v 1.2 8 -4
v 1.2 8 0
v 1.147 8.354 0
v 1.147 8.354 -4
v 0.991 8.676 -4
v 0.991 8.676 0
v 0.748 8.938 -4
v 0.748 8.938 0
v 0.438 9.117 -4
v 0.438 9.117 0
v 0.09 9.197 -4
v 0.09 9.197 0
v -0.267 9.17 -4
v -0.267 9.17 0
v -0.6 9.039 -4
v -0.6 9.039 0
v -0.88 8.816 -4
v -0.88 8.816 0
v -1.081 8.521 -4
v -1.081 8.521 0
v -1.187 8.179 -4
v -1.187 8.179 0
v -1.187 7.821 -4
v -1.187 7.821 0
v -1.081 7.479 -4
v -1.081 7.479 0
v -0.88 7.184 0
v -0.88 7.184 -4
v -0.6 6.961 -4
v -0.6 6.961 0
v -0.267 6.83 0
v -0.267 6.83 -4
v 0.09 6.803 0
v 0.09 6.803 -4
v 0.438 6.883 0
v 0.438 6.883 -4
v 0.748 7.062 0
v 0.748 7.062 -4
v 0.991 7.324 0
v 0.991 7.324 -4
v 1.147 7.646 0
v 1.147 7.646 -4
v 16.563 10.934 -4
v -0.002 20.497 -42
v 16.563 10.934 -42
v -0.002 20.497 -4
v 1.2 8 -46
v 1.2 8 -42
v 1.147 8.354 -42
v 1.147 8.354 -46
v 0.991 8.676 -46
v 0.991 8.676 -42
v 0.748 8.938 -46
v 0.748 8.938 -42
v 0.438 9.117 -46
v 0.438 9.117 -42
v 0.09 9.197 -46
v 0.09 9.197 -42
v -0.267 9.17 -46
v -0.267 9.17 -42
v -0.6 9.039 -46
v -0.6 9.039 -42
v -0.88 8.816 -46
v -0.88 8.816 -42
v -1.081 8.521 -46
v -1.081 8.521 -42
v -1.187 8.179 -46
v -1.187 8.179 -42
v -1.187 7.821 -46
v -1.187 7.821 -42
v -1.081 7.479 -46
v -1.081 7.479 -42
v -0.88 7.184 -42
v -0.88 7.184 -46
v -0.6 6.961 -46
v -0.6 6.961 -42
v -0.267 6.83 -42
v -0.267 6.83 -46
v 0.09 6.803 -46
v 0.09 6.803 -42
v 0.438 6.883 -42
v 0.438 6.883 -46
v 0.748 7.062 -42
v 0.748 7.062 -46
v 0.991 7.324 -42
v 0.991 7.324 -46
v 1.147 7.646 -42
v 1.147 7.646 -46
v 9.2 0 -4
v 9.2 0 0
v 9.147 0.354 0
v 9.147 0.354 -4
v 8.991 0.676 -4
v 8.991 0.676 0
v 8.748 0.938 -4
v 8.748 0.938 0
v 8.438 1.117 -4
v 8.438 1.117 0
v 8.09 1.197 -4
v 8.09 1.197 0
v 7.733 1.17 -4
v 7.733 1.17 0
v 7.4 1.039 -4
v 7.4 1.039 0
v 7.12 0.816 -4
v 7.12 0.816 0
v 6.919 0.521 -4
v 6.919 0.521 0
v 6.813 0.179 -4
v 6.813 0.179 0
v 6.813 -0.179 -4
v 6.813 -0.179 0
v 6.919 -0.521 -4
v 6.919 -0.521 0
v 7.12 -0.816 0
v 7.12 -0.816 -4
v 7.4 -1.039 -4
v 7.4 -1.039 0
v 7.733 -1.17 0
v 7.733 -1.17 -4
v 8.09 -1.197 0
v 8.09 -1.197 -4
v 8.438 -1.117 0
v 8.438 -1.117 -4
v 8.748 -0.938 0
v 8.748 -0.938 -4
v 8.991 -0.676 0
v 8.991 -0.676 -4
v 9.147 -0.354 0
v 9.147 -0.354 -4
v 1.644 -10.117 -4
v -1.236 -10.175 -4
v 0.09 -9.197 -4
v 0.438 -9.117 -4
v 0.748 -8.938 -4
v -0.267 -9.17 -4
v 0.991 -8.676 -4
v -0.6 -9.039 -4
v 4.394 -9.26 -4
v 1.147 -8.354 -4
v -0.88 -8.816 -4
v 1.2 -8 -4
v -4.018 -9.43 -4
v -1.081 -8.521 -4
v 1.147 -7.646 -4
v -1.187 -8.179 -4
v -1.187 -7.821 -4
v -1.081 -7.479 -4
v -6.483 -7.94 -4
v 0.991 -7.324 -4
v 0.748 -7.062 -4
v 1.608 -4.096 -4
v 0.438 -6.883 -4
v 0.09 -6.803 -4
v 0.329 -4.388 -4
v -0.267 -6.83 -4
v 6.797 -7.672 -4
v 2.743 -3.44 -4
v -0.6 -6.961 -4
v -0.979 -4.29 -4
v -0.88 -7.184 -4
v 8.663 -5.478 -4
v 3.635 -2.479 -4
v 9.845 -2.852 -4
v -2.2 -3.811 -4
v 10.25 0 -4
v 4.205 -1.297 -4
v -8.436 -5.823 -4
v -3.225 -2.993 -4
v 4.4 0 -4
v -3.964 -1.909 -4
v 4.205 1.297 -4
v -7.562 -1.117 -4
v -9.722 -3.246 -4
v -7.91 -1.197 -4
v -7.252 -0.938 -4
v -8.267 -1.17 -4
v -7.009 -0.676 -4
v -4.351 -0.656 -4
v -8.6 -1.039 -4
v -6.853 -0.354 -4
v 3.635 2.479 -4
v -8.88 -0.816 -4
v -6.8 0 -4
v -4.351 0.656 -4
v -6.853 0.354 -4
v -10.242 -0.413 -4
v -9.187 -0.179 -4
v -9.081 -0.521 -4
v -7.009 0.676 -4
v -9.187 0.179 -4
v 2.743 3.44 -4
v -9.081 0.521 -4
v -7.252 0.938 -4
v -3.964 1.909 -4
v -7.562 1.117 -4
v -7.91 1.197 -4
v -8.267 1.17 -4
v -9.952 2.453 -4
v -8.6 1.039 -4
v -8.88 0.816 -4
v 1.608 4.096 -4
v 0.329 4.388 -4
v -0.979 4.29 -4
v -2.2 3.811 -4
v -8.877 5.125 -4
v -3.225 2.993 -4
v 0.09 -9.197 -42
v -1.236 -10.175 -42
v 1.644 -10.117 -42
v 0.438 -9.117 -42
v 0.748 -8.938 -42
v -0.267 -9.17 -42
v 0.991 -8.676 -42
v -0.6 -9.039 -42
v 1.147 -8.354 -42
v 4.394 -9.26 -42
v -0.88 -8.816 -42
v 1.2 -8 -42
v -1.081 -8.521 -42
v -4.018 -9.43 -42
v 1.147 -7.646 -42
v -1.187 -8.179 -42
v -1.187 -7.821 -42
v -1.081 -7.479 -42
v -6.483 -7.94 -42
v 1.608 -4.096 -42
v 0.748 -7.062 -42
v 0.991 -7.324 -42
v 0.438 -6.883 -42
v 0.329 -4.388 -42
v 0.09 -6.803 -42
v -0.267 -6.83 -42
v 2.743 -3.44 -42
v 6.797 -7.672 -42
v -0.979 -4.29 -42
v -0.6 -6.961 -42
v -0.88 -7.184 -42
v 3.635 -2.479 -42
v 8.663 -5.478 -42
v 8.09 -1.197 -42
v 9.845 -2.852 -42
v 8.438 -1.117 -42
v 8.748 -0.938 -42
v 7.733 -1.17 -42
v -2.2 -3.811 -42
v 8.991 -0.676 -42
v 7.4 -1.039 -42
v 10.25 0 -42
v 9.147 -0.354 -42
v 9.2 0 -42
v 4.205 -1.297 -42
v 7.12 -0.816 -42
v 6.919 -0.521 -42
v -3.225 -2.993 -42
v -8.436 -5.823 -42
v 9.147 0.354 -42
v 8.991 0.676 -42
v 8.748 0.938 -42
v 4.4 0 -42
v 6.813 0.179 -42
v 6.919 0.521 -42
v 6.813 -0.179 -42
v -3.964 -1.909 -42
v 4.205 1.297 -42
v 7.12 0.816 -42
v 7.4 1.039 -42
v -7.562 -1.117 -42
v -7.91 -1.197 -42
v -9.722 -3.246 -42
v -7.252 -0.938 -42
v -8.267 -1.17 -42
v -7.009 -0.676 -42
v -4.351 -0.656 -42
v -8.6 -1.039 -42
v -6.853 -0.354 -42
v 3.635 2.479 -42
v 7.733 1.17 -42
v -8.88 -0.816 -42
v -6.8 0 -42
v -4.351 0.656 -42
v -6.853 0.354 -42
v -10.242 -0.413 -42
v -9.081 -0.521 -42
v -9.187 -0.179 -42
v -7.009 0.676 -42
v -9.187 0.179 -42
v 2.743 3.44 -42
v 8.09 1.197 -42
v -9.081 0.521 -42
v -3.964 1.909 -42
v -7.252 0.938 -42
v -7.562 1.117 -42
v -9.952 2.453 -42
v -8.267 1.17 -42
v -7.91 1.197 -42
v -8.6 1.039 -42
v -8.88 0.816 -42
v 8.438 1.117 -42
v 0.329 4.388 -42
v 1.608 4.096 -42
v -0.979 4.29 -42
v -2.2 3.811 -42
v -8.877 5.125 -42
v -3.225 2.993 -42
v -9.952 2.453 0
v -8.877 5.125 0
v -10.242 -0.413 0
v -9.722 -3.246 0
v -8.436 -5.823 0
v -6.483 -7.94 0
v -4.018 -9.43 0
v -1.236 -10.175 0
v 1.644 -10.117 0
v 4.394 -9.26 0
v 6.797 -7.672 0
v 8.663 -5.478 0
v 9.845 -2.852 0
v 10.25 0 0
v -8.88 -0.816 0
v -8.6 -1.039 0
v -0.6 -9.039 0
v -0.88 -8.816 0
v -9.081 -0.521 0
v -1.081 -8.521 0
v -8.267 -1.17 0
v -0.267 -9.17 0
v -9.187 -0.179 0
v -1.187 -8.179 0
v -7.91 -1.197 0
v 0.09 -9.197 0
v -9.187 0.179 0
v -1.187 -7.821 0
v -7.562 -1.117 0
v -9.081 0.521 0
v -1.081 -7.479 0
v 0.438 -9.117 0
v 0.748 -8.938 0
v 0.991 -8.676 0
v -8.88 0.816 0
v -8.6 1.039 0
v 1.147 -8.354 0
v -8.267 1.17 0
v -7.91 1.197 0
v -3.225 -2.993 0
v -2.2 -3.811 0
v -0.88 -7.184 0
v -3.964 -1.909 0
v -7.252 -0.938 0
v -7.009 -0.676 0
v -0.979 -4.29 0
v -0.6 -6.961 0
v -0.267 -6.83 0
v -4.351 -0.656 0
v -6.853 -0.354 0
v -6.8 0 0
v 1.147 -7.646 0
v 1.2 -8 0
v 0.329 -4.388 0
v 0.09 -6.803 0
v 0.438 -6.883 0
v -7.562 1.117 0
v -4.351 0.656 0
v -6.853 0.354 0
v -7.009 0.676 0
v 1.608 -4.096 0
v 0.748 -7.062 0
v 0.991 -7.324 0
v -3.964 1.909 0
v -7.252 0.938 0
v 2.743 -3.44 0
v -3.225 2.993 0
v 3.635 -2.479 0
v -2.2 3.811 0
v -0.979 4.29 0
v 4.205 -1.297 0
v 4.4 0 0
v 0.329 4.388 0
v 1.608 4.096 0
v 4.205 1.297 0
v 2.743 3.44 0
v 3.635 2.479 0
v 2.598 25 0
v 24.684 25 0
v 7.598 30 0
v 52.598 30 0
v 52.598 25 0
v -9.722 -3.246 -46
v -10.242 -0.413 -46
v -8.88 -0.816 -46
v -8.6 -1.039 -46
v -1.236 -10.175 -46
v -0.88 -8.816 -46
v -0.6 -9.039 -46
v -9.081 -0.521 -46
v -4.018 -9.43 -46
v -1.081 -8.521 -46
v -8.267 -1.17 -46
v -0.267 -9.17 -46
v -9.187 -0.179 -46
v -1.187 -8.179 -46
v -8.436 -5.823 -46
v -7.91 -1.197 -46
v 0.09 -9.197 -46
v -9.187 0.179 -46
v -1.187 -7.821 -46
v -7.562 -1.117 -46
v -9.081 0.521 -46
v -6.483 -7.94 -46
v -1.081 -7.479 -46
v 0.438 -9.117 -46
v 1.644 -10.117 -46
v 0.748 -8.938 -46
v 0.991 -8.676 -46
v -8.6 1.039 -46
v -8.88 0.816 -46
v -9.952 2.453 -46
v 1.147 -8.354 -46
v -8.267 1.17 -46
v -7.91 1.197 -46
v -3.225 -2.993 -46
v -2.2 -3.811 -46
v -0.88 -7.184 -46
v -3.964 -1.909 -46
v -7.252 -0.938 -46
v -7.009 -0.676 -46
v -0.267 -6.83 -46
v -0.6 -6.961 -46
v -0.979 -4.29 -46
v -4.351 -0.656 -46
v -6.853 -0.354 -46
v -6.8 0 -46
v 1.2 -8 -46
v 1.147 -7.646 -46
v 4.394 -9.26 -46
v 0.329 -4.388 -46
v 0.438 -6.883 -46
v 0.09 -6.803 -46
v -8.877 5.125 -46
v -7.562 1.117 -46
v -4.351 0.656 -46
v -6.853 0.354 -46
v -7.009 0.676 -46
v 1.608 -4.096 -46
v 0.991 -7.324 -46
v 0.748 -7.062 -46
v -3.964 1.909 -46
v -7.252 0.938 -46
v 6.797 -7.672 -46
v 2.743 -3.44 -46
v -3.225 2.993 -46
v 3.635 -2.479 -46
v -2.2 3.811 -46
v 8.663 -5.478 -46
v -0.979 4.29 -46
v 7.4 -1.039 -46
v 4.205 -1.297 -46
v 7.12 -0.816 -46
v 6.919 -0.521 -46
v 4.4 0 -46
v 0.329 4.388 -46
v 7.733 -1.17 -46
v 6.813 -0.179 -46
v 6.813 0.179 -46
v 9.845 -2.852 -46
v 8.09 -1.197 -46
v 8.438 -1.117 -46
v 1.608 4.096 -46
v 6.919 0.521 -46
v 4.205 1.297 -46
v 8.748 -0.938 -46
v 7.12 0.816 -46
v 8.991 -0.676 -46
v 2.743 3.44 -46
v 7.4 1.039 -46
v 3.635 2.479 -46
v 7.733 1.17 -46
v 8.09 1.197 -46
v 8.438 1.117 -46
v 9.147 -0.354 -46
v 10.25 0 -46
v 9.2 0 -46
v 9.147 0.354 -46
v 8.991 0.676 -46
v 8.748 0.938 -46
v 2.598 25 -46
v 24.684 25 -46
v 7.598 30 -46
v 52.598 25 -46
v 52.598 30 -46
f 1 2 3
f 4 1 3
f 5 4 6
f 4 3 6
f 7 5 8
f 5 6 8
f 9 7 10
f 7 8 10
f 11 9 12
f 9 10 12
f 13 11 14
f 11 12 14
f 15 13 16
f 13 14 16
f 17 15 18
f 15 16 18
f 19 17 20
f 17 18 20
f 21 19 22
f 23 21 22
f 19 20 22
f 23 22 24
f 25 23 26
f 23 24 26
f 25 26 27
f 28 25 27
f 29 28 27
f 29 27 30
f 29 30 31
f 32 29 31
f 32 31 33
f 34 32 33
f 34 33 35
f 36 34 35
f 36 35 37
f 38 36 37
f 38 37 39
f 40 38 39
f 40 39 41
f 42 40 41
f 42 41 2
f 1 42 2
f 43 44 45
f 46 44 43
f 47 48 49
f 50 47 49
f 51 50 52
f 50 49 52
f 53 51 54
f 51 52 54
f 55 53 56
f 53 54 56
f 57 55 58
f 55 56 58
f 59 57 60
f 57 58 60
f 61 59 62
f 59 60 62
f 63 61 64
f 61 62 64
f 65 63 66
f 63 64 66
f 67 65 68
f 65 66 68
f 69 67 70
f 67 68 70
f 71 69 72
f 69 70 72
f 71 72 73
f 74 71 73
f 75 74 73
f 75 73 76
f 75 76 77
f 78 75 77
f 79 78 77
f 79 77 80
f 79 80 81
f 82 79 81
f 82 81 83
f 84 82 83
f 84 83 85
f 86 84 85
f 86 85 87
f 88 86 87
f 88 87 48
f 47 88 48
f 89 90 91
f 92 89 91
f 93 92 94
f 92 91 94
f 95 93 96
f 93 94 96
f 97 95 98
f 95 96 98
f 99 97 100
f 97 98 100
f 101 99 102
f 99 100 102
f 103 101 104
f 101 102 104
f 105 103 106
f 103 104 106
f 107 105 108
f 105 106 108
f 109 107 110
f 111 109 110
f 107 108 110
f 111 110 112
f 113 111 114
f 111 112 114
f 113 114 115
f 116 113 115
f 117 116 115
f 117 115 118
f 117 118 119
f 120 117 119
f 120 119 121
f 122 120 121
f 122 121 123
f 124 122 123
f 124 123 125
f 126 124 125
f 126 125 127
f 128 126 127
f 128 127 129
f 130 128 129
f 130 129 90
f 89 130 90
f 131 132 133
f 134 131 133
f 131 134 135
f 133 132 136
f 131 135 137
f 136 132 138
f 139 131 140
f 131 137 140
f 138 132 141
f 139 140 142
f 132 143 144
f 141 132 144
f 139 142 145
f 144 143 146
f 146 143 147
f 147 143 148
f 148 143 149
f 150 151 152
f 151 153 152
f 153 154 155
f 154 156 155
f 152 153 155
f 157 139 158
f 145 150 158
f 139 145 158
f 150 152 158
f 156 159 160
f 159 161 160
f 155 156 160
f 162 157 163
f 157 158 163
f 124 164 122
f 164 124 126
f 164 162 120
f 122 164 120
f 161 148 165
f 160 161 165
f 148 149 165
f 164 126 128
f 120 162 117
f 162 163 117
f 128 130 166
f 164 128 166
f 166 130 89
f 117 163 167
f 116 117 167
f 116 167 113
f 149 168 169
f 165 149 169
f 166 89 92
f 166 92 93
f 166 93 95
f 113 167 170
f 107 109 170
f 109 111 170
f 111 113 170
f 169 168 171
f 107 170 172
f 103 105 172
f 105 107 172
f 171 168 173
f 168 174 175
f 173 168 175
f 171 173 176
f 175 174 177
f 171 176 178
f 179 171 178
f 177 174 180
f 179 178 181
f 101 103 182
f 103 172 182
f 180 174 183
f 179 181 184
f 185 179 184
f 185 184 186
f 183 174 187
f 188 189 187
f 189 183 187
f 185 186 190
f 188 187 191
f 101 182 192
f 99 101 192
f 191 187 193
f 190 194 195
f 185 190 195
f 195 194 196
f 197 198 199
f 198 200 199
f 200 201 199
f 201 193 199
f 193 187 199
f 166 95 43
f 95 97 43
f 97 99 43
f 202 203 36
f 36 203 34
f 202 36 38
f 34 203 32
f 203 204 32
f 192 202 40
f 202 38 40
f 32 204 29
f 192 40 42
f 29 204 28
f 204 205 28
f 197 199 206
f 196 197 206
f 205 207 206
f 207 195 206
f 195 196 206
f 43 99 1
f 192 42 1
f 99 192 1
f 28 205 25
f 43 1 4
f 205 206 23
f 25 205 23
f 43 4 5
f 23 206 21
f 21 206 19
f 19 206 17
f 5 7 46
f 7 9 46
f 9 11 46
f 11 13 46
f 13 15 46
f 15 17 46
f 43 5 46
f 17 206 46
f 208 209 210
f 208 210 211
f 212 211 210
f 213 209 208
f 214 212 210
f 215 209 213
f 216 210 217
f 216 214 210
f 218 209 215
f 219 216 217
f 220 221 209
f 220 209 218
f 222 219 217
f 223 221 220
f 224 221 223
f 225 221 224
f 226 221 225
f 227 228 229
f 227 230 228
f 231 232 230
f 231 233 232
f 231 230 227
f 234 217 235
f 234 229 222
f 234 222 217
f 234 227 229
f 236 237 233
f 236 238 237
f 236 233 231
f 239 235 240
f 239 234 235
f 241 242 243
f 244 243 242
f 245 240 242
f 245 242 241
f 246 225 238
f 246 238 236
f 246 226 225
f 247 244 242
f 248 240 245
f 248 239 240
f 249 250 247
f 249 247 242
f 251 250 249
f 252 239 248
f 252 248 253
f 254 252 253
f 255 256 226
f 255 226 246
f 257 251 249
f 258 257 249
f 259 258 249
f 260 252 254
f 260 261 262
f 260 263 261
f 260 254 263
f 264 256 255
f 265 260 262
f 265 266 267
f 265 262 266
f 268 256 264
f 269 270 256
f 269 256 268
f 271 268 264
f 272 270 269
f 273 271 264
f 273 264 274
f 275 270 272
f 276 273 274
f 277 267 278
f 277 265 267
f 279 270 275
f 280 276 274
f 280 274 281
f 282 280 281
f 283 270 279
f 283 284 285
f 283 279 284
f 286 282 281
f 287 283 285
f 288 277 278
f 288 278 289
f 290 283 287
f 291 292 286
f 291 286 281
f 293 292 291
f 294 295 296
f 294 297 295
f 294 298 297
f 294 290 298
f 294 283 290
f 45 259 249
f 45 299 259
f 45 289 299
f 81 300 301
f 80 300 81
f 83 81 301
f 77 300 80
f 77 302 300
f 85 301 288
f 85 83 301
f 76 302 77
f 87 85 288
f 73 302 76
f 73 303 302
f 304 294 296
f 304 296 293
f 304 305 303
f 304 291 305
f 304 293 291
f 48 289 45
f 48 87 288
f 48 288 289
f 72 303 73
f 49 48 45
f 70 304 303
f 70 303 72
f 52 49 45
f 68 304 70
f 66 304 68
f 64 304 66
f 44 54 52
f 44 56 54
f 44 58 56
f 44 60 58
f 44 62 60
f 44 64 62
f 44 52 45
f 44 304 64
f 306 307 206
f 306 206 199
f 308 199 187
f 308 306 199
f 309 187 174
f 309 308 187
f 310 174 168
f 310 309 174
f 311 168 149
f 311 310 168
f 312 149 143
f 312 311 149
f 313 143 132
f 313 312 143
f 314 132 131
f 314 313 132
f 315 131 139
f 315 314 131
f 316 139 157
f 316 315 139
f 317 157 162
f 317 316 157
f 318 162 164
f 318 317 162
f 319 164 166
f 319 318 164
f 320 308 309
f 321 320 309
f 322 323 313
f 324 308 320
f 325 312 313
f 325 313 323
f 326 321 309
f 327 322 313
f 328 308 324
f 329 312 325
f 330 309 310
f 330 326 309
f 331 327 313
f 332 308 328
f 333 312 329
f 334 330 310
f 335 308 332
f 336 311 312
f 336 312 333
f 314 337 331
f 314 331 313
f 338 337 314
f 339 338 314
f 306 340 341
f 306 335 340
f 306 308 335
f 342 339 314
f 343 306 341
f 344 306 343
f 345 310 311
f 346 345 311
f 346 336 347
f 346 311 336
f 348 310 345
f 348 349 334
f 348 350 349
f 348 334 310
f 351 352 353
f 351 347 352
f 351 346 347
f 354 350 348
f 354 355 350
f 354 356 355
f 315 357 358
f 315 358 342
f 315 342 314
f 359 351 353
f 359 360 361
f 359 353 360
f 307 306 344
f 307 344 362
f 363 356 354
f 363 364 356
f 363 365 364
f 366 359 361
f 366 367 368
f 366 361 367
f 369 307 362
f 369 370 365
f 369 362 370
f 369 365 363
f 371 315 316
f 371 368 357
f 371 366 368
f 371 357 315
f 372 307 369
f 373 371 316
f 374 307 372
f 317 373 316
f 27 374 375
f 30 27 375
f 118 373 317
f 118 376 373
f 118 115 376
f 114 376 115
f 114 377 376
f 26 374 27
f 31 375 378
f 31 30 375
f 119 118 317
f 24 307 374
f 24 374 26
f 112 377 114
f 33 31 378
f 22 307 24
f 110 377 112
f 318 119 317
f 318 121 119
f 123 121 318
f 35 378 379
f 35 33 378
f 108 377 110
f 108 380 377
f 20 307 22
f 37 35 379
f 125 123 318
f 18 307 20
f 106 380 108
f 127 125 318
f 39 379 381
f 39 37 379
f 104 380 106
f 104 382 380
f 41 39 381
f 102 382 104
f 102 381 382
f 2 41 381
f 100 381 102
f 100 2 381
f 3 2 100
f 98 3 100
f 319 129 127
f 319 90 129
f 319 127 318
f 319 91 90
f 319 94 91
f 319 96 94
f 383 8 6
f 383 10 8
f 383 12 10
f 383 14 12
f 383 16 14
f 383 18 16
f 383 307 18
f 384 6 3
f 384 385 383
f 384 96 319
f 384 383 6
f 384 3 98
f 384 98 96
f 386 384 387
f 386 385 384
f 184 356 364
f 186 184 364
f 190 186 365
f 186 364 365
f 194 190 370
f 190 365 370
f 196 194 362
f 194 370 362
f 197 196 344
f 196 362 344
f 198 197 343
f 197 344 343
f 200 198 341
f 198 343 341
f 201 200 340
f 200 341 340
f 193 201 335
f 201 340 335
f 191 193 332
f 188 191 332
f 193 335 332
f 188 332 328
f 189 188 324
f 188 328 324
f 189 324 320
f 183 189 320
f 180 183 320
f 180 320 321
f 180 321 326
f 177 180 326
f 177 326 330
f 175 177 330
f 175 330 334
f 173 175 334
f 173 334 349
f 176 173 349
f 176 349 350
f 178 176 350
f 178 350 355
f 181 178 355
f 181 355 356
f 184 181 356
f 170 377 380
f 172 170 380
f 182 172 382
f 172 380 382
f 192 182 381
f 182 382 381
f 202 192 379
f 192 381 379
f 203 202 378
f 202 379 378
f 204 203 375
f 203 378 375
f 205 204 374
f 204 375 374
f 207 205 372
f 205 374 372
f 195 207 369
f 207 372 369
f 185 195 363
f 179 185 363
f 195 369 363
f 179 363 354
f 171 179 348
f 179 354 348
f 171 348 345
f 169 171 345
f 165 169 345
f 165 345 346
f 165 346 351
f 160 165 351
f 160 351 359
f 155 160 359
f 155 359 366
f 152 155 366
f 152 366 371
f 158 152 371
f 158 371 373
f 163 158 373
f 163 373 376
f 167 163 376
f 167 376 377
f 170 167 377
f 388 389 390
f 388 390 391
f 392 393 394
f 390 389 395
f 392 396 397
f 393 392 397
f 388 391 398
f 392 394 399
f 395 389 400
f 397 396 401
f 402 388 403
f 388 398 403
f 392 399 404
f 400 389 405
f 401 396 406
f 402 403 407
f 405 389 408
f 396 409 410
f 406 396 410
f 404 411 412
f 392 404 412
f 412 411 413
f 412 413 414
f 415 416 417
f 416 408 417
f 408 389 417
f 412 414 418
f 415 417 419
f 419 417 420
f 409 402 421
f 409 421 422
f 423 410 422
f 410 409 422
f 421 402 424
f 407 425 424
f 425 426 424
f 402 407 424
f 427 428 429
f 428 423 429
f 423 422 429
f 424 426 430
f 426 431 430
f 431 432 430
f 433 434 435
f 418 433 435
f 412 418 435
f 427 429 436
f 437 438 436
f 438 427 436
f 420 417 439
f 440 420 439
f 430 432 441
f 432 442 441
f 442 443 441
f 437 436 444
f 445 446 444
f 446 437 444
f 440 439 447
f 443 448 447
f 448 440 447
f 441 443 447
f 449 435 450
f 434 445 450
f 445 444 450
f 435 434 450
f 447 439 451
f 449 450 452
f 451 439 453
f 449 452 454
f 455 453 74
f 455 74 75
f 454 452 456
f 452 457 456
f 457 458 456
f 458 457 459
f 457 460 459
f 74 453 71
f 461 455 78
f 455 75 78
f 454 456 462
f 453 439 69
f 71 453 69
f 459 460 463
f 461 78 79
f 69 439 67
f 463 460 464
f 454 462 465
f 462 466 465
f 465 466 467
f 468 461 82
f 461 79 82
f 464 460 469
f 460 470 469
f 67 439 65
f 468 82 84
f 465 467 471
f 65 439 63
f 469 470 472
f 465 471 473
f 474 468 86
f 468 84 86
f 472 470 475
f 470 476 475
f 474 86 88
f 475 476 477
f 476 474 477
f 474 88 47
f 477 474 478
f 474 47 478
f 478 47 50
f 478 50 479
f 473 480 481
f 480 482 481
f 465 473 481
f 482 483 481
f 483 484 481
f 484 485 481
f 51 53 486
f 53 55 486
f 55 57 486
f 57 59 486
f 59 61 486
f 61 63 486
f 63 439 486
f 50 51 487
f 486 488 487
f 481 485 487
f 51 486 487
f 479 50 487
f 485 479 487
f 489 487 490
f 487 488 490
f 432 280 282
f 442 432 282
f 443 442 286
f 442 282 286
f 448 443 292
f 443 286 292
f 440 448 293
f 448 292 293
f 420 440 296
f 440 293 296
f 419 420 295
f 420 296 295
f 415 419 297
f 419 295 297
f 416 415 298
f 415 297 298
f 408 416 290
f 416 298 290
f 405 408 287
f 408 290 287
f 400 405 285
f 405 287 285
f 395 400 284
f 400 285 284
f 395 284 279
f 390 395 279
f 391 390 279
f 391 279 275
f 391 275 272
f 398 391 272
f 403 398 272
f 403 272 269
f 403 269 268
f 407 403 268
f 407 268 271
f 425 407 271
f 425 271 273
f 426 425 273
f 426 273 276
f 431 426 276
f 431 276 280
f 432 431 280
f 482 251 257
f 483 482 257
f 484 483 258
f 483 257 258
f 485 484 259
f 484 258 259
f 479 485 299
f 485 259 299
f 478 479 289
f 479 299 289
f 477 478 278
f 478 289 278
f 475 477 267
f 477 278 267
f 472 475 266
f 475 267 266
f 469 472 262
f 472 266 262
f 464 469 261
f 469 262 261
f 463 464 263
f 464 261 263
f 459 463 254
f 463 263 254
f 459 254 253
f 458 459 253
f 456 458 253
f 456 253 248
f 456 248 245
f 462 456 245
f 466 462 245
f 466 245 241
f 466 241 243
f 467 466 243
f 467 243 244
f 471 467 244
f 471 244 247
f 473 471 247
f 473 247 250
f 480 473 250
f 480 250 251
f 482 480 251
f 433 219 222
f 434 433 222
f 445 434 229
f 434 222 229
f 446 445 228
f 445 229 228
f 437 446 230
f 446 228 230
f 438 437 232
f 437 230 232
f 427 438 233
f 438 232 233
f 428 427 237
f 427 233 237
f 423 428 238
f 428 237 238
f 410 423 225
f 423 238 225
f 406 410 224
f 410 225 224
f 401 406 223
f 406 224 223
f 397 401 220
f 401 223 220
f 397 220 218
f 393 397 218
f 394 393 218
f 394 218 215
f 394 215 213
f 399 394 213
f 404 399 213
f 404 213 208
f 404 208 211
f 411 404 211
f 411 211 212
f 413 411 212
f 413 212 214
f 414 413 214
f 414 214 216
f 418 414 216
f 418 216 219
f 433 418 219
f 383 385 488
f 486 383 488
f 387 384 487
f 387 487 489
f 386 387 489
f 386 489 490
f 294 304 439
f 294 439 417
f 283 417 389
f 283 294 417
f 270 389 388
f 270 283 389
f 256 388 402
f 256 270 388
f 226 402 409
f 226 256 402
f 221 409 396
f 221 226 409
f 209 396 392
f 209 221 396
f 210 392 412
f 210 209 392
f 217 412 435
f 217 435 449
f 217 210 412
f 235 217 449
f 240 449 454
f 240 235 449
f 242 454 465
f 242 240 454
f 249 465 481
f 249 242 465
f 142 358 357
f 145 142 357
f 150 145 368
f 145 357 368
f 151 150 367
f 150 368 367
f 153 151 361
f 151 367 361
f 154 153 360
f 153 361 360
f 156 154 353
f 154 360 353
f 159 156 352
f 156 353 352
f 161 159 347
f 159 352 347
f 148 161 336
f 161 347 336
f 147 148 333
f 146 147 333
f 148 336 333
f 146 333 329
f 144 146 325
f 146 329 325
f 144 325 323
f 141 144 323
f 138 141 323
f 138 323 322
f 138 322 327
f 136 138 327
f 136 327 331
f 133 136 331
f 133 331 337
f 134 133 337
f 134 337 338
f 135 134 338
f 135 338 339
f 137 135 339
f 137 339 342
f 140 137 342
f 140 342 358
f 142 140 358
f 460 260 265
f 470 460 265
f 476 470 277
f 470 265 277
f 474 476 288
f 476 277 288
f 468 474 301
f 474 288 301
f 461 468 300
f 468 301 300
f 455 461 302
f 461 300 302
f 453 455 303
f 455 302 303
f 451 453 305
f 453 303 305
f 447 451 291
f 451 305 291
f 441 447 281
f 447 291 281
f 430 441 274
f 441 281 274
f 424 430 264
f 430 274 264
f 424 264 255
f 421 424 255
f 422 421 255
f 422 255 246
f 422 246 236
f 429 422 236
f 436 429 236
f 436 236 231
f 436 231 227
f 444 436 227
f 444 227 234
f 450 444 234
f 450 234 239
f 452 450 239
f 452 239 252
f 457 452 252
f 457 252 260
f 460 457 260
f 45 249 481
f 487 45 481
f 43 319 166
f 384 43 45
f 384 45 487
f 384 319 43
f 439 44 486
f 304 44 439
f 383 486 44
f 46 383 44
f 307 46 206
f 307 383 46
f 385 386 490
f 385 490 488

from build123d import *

# Parameters (mm, degrees)
SKETCH1_R           = 4.4
SKETCH1_R_2         = 1.2
BOSS_EXTRUDE1_DEPTH = 46
SKETCH3_W           = 38
SKETCH3_H           = 28
CUT_EXTRUDE2_DEPTH  = 81.708866675
CHAMFER1_SIZE       = 5


with BuildPart() as part:
    # Sketch1 → Boss-Extrude1 (new body)
    with BuildSketch(Plane.XY):
        with BuildLine():
            Line((2.598076211, 25), (-8.876760389, 5.125))
            ThreePointArc((-8.876760389, 5.125), (-2.652895212, -9.900739719), (10.25, 0))
            Line((10.25, 0), (24.68375673, 25))
            Line((24.68375673, 25), (52.598076211, 25))
            Line((52.598076211, 25), (52.598076211, 30))
            Line((52.598076211, 30), (2.598076211, 30))
            Line((2.598076211, 30), (2.598076211, 25))
        make_face()
        Circle(SKETCH1_R, mode=Mode.SUBTRACT)
        with Locations((-8, 0)):
            Circle(SKETCH1_R_2, mode=Mode.SUBTRACT)
        with Locations((0, -8)):
            Circle(SKETCH1_R_2, mode=Mode.SUBTRACT)
        with Locations((8, 0)):
            Circle(SKETCH1_R_2, mode=Mode.SUBTRACT)
        with Locations((0, 8)):
            Circle(SKETCH1_R_2, mode=Mode.SUBTRACT)
    extrude(amount=-BOSS_EXTRUDE1_DEPTH)

    # Sketch3 → Cut-Extrude2 (cut, through all)
    with BuildSketch(Plane(origin=(-8.876760389, 5.125, 0), x_dir=(0, 0, 1), z_dir=(-0.8660254037844363, 0.500000000000004, 0))):
        with Locations((-23, 3.75)):
            Rectangle(SKETCH3_W, SKETCH3_H)
    extrude(amount=-CUT_EXTRUDE2_DEPTH, mode=Mode.SUBTRACT)

    # Chamfer1
    chamfer1_edges = [part.edges().sort_by_distance(p)[0] for p in [
        (2.598076211, 30, -23),
    ]]
    chamfer(chamfer1_edges, length=CHAMFER1_SIZE - 0.0001)  # a hair under: the kernel refuses the full size


solid = part.part
